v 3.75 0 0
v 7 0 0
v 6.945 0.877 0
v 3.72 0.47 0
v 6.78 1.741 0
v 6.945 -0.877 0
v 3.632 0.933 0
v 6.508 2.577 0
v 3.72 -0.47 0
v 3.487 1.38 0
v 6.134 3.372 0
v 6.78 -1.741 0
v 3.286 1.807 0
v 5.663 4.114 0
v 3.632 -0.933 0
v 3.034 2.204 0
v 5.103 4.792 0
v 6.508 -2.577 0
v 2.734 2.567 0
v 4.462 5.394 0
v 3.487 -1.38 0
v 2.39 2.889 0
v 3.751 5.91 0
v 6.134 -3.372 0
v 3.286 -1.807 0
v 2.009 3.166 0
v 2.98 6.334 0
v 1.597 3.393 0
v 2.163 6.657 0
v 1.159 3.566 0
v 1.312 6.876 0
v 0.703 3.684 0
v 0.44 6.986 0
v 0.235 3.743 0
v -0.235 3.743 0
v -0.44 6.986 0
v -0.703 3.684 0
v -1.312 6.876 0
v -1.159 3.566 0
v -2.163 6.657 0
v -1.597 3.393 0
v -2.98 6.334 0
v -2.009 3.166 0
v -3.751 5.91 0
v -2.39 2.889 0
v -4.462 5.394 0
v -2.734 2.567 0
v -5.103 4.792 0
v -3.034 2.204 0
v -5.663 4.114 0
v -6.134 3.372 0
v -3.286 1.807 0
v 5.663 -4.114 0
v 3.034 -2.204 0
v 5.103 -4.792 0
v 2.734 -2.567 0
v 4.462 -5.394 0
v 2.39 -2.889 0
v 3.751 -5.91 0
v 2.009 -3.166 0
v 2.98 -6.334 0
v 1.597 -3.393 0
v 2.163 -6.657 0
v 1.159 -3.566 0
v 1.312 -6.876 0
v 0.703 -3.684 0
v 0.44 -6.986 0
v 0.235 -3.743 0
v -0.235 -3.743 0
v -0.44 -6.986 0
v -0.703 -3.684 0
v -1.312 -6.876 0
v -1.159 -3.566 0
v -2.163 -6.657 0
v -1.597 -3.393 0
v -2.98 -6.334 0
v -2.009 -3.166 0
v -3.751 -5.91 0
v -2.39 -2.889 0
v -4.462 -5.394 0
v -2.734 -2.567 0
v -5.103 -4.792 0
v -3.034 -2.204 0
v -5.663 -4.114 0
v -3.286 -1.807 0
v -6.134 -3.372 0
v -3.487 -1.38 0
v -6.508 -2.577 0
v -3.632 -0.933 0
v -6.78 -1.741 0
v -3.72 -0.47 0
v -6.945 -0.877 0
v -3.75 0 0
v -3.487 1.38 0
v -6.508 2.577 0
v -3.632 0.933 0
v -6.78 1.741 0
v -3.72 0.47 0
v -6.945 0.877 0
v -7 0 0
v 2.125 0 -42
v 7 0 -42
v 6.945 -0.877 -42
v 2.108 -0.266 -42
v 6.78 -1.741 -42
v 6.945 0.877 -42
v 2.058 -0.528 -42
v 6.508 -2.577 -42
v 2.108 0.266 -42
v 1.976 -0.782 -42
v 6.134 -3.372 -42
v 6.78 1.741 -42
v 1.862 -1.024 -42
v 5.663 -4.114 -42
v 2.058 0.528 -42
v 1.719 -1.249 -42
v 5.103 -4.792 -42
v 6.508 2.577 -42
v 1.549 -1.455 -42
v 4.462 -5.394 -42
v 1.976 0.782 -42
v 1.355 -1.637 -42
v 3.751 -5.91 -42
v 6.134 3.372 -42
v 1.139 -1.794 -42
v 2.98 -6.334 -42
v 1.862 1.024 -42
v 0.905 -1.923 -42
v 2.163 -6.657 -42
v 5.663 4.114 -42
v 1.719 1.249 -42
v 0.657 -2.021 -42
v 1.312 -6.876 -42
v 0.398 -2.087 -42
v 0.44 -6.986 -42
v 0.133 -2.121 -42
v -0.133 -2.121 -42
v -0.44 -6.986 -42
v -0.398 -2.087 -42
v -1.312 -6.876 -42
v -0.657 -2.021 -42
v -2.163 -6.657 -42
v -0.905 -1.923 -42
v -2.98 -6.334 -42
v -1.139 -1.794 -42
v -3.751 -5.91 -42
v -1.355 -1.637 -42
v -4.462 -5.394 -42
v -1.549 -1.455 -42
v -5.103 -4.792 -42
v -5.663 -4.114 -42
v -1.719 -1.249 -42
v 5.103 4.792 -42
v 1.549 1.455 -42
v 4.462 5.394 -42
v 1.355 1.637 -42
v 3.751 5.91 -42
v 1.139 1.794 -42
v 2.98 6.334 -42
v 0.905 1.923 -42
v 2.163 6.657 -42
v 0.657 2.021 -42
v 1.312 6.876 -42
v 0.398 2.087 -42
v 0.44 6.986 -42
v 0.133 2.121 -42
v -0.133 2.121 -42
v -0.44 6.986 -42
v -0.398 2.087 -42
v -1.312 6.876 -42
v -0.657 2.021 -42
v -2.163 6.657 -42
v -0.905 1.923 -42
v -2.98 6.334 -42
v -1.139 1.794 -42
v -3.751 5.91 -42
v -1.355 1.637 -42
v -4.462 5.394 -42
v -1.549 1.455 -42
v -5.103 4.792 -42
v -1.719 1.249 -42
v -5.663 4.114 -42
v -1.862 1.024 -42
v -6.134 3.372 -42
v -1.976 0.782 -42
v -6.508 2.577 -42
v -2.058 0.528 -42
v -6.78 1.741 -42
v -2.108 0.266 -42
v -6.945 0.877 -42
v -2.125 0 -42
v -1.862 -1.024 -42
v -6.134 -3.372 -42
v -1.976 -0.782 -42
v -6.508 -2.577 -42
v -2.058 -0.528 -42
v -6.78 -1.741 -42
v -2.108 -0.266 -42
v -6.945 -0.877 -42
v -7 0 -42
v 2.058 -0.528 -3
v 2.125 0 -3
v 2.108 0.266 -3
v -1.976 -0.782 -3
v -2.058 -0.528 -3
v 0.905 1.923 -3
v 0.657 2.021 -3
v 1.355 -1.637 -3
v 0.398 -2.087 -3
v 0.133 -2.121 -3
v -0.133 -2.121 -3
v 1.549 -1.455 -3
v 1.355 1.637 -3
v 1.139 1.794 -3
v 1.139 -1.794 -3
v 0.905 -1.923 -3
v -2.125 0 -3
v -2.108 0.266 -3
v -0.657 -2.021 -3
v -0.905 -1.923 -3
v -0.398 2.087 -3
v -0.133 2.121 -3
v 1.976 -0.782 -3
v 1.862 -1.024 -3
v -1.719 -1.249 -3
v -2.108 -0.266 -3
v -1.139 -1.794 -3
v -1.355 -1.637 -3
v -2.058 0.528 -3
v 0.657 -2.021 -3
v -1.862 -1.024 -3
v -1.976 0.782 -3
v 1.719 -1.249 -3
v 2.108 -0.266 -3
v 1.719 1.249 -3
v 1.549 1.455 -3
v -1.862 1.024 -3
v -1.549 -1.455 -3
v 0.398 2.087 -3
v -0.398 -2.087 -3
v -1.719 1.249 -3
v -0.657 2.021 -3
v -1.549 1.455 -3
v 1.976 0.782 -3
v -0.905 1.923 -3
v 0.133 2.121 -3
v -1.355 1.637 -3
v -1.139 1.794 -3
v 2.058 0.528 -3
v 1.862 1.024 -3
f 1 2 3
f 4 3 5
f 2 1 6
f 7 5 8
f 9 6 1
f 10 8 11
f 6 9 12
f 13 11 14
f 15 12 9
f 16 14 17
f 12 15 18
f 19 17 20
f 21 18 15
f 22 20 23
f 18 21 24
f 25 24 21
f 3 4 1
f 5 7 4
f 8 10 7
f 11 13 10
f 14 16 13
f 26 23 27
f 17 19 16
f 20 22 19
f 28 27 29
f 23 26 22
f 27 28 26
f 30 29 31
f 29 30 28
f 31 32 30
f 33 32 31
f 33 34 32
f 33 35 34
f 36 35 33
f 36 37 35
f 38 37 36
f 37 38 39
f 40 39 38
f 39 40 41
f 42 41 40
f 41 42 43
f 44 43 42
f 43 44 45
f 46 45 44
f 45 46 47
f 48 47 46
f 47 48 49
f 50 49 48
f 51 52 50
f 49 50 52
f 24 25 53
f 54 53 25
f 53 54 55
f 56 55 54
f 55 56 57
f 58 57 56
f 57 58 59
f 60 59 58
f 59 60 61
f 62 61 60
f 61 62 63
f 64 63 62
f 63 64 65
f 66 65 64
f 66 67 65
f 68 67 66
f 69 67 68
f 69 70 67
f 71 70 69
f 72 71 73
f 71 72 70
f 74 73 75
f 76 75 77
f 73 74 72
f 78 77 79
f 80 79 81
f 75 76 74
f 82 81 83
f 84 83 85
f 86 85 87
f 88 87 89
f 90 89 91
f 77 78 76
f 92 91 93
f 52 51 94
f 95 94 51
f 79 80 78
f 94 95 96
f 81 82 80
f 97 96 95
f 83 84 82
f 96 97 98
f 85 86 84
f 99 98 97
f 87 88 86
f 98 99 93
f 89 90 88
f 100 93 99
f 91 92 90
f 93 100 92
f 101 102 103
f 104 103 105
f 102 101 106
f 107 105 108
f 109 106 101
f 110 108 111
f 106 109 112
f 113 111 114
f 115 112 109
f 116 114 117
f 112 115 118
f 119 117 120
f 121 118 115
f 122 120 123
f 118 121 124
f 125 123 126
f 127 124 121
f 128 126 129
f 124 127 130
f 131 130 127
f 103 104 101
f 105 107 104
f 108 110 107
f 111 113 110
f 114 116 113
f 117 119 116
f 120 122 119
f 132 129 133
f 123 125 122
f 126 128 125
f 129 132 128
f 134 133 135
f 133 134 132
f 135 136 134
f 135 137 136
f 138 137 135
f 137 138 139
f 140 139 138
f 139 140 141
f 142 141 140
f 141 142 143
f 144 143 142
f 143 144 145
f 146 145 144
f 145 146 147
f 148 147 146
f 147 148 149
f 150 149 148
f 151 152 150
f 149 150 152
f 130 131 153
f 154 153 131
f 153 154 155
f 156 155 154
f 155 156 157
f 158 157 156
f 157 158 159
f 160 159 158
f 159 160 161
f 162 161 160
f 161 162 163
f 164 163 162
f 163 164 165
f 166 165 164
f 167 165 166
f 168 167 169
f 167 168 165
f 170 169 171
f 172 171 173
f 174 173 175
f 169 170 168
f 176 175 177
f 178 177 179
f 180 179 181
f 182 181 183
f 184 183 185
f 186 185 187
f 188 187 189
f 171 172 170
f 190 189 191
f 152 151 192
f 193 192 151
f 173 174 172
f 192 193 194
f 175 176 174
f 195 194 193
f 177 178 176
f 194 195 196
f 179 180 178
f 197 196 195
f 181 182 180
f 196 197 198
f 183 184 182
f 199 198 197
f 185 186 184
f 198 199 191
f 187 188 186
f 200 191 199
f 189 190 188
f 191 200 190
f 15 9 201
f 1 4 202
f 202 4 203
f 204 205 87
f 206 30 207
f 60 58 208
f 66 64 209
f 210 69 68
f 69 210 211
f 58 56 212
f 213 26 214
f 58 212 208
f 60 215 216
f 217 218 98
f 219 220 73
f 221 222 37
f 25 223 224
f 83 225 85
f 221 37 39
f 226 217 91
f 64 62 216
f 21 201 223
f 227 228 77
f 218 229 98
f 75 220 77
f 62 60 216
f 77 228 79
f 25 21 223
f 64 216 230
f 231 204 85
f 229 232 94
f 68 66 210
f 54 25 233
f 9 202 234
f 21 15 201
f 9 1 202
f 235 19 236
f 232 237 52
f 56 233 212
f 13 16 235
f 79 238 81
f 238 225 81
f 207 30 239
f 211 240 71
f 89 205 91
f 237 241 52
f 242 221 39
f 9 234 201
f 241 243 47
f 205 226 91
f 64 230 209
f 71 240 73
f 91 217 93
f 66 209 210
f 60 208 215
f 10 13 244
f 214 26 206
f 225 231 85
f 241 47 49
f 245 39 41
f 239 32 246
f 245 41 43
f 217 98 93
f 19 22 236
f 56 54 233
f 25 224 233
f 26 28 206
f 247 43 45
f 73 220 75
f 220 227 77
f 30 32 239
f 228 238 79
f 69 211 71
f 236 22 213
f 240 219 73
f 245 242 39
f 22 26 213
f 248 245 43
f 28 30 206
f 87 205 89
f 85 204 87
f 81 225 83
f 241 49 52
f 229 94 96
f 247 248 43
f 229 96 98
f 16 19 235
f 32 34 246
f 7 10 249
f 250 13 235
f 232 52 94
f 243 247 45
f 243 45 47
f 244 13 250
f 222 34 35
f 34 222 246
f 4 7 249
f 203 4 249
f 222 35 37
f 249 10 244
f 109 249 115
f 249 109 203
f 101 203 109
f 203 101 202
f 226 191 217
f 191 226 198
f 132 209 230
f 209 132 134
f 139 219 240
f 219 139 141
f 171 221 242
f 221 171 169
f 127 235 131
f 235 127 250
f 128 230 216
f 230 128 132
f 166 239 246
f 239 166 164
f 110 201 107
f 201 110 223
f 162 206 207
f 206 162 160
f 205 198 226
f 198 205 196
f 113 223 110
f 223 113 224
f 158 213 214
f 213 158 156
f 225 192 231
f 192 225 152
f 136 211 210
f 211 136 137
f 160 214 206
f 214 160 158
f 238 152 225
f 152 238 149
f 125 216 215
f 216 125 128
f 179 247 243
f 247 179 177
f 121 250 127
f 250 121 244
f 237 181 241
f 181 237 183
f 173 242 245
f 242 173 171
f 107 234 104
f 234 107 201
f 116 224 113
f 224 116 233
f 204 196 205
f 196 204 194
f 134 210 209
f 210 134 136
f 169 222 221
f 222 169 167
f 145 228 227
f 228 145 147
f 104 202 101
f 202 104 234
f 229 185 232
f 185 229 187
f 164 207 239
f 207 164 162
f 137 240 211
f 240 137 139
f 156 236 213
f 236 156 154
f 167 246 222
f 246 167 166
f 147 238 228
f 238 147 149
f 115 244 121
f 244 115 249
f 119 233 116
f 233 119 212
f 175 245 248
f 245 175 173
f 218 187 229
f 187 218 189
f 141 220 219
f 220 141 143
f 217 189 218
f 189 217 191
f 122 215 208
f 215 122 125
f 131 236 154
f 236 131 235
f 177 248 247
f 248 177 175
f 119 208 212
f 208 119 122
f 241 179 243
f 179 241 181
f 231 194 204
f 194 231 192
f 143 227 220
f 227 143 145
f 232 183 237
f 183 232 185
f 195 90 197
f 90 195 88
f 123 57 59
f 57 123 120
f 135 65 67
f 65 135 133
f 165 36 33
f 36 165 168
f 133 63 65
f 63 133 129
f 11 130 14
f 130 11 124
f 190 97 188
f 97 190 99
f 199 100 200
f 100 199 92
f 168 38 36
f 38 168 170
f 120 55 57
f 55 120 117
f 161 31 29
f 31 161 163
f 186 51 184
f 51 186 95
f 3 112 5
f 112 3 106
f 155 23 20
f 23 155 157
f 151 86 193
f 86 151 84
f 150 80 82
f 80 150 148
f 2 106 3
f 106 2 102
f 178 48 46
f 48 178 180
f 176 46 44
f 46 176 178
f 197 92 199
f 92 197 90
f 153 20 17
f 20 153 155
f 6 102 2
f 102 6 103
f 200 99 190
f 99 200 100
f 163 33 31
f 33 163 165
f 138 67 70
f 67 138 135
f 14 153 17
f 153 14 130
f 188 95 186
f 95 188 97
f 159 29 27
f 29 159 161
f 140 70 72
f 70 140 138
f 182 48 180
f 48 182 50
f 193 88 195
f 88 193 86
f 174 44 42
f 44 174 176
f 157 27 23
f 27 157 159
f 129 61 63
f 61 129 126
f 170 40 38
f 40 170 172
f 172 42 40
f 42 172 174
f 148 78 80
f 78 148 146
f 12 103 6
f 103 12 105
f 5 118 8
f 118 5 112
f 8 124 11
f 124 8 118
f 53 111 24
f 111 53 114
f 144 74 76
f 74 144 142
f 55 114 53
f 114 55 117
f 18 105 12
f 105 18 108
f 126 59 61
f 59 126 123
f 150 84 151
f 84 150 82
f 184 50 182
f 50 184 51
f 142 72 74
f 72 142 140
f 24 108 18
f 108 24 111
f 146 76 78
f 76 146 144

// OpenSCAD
$fn = 50;


difference() {
	union() {
		translate(v = [0, 0, -42.0000000000]) {
			cylinder(h = 42, r = 7.0000000000);
		}
		cylinder(h = 0, r = 17.0000000000);
	}
	union() {
		translate(v = [0, 0, 0]) {
			rotate(a = [0, 0, 0]) {
				difference() {
					union() {
						#translate(v = [0, 0, -42.0000000000]) {
							cylinder(h = 42, r = 2.0000000000);
						}
						#translate(v = [0, 0, -3]) {
							cylinder(h = 3, r = 7.0000000000, r1 = 2.1250000000, r2 = 3.7500000000);
						}
						#translate(v = [0, 0, -42.0000000000]) {
							cylinder(h = 42, r = 2.1250000000);
						}
						#translate(v = [0, 0, -42.0000000000]) {
							cylinder(h = 42, r = 2.0000000000);
						}
					}
					union();
				}
			}
		}
	}
}
